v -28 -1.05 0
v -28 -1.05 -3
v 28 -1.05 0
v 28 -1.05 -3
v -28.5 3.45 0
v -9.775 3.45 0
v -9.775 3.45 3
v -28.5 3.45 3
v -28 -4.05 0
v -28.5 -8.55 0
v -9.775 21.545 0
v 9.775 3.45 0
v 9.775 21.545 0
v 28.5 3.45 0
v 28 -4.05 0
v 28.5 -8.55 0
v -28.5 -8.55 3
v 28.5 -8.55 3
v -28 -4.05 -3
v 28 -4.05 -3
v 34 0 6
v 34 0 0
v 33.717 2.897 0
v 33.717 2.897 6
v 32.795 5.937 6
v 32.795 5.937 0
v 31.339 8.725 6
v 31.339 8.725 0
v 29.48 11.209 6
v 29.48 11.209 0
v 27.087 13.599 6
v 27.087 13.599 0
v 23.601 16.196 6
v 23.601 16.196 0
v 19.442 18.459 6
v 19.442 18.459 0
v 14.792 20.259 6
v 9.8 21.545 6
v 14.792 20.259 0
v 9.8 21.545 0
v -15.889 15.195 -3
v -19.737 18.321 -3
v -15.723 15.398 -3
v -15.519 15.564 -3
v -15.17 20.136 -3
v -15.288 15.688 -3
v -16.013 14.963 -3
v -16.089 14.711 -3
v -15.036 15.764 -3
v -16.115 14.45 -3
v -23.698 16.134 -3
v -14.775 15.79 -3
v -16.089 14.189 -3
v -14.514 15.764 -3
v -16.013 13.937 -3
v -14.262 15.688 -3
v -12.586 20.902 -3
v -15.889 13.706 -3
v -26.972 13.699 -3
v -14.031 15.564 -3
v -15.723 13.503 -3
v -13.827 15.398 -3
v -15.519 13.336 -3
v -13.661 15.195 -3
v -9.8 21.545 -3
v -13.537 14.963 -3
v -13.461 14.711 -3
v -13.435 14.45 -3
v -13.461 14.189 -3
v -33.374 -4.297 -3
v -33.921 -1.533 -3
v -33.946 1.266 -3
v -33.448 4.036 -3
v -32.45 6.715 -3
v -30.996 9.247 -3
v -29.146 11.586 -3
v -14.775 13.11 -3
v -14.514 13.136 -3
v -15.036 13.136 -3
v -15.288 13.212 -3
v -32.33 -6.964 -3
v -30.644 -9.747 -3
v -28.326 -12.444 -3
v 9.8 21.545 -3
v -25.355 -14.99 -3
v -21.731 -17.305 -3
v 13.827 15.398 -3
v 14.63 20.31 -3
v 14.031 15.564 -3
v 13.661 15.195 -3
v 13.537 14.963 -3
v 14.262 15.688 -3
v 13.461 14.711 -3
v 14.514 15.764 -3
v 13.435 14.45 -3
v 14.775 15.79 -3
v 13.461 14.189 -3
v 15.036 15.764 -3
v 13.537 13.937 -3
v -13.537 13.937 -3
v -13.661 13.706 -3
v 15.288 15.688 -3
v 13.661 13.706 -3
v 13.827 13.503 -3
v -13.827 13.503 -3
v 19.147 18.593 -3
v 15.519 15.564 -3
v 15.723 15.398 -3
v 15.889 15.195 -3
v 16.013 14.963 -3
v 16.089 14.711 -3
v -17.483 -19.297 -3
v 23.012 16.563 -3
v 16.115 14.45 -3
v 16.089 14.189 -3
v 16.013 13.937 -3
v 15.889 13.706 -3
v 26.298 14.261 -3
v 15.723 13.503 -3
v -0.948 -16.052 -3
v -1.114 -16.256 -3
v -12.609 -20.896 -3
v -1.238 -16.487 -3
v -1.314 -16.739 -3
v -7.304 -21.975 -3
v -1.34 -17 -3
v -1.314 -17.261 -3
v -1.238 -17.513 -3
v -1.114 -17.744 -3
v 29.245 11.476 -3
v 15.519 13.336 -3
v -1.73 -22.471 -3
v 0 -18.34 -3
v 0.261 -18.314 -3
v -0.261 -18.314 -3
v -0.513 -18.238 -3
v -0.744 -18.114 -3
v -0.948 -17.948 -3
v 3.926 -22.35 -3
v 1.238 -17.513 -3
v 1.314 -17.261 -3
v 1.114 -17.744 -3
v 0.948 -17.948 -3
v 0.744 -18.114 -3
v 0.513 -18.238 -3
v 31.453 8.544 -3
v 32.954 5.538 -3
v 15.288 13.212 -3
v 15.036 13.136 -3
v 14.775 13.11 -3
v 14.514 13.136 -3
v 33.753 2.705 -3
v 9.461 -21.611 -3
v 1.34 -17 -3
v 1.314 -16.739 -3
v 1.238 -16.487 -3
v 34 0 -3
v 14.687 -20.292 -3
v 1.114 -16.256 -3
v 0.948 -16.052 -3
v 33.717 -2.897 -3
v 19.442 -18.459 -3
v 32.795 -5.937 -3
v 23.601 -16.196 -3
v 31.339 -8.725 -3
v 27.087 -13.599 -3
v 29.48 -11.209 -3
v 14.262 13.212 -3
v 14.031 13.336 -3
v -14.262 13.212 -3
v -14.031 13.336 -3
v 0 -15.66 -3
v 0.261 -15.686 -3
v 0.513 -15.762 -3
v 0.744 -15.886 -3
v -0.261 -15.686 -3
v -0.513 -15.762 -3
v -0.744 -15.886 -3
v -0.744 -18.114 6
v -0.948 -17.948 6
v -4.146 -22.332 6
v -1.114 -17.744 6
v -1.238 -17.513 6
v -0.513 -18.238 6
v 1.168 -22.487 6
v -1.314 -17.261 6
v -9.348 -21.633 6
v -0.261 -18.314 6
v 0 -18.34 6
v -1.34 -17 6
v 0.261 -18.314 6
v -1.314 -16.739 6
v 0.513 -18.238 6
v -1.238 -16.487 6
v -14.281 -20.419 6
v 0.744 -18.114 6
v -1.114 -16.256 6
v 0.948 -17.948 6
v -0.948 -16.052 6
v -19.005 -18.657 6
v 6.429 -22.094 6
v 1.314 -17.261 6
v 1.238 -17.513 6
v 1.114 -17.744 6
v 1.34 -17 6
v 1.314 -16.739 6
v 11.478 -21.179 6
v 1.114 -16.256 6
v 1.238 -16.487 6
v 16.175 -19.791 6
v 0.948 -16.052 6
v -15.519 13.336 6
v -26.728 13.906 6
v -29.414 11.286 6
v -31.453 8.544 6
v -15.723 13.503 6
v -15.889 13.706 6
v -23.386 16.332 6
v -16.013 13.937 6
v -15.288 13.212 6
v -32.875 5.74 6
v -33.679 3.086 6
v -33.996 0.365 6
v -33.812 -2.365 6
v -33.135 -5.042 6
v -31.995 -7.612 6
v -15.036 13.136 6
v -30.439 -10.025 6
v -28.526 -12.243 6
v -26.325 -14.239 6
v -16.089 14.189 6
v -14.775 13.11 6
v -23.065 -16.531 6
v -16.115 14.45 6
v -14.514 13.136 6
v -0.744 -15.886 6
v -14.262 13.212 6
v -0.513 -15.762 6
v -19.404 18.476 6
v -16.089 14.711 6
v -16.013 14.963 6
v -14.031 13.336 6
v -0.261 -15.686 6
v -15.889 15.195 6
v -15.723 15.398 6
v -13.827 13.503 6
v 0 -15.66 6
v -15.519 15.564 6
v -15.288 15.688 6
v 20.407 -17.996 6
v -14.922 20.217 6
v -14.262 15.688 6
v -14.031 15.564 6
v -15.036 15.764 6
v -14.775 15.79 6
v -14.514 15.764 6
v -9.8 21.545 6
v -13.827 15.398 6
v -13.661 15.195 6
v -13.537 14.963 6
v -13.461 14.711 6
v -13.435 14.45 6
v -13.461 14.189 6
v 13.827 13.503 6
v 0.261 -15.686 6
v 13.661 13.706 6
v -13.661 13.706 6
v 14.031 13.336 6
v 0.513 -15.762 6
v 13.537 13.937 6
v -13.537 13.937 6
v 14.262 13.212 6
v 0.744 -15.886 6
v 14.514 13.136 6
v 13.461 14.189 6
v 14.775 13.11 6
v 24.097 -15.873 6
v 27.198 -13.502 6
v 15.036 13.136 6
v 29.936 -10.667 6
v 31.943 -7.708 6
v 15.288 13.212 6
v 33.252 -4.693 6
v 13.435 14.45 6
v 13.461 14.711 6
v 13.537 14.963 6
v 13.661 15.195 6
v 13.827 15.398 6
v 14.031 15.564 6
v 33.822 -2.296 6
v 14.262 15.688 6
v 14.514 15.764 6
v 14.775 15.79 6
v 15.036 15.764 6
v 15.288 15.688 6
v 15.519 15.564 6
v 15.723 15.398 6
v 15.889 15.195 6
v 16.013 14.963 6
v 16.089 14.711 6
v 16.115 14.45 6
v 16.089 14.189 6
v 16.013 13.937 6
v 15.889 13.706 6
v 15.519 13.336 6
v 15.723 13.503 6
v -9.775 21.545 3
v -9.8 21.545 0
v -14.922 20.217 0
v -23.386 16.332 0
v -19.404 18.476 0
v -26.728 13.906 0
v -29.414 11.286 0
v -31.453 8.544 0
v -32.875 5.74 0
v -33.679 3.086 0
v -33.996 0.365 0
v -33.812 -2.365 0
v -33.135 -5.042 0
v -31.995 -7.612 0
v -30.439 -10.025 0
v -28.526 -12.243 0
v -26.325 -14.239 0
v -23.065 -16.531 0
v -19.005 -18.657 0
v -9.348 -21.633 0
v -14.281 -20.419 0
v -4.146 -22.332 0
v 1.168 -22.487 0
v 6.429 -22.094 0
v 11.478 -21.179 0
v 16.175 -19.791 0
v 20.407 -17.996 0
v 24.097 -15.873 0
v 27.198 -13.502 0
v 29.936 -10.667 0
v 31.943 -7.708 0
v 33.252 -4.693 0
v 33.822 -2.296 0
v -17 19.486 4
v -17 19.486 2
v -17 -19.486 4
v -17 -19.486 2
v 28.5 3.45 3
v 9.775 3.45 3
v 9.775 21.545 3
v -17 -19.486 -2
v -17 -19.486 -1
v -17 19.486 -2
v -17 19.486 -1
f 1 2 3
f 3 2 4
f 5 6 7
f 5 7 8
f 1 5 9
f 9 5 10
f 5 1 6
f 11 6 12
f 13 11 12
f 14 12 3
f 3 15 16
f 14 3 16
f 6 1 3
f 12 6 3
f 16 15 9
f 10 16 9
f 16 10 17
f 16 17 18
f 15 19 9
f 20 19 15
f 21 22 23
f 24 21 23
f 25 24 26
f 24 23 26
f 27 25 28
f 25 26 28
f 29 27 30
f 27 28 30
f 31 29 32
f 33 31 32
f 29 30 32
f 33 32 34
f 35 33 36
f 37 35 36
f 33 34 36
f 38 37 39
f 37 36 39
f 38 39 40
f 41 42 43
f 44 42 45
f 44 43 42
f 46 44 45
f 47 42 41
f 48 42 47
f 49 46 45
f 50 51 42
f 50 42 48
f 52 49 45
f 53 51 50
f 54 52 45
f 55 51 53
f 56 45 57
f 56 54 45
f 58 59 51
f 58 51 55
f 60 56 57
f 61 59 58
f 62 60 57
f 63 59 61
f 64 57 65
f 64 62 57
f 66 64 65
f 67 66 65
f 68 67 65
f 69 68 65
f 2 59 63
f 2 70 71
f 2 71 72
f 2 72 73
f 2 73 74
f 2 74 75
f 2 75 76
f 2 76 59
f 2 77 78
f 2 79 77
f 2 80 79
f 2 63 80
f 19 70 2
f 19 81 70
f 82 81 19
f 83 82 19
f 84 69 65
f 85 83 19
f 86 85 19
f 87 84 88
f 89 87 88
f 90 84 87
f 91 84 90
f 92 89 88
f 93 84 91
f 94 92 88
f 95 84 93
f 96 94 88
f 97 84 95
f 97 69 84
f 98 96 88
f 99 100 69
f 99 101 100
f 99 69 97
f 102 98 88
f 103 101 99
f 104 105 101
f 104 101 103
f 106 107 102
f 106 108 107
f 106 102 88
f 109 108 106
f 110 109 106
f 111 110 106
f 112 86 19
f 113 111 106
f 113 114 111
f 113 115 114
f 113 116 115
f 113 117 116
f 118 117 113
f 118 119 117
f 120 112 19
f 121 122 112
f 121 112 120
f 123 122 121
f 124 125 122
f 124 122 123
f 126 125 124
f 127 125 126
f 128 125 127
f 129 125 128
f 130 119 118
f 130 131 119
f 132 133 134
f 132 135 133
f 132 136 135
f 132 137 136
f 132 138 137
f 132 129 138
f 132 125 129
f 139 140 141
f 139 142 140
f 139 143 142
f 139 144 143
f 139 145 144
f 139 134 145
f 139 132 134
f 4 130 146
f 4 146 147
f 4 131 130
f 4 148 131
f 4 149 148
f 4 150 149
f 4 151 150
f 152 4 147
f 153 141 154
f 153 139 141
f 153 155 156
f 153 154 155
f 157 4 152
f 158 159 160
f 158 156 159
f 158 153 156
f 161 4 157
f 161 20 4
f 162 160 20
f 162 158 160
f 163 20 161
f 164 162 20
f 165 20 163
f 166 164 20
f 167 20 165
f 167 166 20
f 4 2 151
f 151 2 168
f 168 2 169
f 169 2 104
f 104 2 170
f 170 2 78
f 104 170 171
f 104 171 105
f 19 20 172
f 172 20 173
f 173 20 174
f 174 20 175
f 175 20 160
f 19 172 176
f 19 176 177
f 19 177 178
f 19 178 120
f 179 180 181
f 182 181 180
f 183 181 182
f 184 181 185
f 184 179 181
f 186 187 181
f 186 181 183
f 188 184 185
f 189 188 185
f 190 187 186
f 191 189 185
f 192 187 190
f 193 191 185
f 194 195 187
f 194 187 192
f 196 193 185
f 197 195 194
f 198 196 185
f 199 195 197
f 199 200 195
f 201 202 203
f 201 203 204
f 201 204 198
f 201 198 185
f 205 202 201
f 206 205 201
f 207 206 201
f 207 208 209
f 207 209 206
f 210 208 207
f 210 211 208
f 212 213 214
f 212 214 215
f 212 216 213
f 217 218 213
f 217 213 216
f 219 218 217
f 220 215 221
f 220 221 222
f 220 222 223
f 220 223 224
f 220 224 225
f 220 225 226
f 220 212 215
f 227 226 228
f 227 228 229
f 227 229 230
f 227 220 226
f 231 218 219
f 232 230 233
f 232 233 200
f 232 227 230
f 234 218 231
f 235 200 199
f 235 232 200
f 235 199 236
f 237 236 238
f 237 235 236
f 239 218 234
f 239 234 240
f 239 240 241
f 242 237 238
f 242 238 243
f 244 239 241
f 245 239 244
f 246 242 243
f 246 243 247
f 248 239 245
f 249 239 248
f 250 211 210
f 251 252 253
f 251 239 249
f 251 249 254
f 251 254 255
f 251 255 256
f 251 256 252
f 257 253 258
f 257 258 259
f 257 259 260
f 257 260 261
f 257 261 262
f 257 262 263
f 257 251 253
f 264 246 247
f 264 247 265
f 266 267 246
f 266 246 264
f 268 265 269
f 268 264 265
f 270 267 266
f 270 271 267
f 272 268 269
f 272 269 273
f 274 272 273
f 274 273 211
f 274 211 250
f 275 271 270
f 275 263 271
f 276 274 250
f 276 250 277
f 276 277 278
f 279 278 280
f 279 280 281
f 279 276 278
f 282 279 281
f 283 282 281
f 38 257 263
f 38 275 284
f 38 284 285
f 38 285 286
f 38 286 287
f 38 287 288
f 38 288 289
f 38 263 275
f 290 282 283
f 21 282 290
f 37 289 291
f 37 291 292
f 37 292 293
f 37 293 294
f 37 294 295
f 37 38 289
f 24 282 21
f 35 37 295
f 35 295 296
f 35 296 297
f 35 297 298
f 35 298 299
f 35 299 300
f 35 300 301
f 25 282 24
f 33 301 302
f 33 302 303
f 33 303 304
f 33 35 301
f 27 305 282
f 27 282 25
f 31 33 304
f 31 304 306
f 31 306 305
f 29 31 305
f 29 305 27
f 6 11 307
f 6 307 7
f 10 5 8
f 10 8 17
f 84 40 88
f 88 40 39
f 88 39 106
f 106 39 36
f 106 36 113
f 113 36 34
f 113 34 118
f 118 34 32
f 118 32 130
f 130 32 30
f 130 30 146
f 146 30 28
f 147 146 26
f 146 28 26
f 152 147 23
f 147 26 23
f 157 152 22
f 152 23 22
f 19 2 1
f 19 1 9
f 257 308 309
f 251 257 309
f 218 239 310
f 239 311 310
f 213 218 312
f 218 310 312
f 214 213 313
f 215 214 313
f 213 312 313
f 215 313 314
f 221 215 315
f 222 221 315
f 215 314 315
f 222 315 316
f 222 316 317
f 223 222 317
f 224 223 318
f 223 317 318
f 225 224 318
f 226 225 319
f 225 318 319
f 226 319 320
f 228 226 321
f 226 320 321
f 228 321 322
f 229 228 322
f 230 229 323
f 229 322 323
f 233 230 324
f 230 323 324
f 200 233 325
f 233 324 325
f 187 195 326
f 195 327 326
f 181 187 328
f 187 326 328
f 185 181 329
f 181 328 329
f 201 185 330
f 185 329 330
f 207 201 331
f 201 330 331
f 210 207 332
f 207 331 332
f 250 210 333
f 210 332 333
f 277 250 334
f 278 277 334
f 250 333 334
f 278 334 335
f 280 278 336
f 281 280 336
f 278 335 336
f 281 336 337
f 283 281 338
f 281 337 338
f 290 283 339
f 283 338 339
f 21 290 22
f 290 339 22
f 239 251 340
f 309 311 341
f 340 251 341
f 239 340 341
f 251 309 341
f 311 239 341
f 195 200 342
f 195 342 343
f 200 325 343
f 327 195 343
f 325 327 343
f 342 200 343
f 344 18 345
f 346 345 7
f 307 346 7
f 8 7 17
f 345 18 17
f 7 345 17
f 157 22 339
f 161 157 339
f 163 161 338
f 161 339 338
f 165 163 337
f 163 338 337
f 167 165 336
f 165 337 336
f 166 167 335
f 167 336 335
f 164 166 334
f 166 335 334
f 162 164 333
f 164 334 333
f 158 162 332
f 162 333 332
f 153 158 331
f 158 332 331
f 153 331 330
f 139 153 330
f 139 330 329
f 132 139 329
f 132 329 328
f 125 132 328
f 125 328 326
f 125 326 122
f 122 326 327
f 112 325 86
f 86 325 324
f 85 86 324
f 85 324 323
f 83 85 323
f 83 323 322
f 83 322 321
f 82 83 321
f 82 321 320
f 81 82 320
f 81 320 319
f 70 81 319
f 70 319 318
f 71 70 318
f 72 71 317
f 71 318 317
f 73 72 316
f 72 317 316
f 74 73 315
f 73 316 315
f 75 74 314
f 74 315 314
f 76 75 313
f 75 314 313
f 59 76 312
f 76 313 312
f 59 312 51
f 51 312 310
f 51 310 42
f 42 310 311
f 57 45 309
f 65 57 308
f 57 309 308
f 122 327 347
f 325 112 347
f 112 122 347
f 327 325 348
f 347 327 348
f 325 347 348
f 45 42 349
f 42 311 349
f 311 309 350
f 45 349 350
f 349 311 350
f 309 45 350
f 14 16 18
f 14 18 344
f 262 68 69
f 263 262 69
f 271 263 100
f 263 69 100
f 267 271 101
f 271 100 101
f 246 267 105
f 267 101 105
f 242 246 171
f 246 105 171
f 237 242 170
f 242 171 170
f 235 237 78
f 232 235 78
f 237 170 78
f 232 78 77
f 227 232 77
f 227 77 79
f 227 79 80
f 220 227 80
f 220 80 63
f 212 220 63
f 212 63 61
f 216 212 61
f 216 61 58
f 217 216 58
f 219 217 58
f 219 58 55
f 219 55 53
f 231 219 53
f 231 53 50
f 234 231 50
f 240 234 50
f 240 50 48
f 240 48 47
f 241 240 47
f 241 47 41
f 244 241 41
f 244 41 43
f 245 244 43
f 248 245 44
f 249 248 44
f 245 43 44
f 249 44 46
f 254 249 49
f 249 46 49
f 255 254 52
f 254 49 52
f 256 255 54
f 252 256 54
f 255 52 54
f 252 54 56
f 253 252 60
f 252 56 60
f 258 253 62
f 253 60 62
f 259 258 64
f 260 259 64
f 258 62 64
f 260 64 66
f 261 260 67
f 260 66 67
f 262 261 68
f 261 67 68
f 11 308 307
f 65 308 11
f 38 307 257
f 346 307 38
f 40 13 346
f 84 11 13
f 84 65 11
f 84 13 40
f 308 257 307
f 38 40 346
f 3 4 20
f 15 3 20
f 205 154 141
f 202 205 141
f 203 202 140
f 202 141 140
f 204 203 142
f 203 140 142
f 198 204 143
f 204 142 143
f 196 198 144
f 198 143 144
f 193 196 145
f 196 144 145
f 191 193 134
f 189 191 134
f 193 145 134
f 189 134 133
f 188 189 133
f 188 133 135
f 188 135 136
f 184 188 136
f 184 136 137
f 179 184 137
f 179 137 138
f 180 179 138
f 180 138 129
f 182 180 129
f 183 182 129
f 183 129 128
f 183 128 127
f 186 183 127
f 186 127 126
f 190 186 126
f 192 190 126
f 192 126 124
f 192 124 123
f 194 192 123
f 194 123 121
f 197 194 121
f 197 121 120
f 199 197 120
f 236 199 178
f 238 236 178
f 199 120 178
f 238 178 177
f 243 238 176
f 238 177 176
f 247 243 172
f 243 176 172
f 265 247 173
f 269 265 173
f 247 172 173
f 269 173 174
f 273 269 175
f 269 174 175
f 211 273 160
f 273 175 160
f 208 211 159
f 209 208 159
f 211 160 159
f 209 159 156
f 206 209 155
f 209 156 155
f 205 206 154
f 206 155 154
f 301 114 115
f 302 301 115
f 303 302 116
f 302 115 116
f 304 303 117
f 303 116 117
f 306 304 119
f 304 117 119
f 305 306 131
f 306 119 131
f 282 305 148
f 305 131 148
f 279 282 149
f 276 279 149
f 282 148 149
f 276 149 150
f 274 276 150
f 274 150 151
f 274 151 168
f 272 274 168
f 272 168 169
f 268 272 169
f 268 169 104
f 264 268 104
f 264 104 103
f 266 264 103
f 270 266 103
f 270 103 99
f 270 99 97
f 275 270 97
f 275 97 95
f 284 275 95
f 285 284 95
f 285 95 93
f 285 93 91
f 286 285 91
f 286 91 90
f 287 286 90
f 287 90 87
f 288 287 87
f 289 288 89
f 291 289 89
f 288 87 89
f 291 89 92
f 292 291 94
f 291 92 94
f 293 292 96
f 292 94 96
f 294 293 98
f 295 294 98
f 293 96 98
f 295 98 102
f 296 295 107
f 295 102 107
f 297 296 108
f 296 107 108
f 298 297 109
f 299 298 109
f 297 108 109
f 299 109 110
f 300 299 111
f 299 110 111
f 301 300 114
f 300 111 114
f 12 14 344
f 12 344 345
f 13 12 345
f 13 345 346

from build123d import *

# Parameters (mm, degrees)
PAD_DEPTH       = 6
POCKET_DEPTH    = 3
PAD001_DEPTH    = 3
SKETCH003_W     = 56
SKETCH003_H     = 3
POCKET001_DEPTH = 3
SKETCH004_W     = 19.6
SKETCH004_H     = 1
POCKET002_DEPTH = 9.001
SKETCH005_R     = 1.34
POCKET003_DEPTH = 9.001


with BuildPart() as part:
    # Sketch → Pad (new body)
    with BuildSketch(Plane.XY):
        with BuildLine():
            add(Edge.make_bspline(
                [(34, 0), (34, 38.971143), (-17, 19.485572), (-68, 0), (-17, -19.485572), (34, -38.971143), (34, 0)],
                knots=[0, 0, 0, 2.094395, 2.094395, 4.18879, 4.18879, 6.283185, 6.283185, 6.283185], degree=2, weights=[1, 0.5, 1, 0.5, 1, 0.5, 1]))
        make_face()
    extrude(amount=PAD_DEPTH)

    # Sketch001 (on Face2 of Pad) → Pocket (cut)
    with BuildSketch(Plane(origin=(0, 0, 0), x_dir=(1, 0, 0), z_dir=(0, 0, -1))):
        Polygon((9.775, -3.450064), (9.775, -21.550064), (-9.775, -21.550064), (-9.775, -3.450064), (-28.5, -3.450064), (-28.5, 8.549936), (28.5, 8.549936), (28.5, -3.450064), align=None)
    extrude(amount=-POCKET_DEPTH, mode=Mode.SUBTRACT)

    # Sketch002 (on Face2 of Pocket) → Pad001 (join)
    with BuildSketch(Plane(origin=(0, 0, 0), x_dir=(1, 0, 0), z_dir=(0, 0, -1))):
        with BuildLine():
            add(Edge.make_bspline(
                [(34, 0), (34, 38.971143), (-17, 19.485572), (-68, 0), (-17, -19.485572), (34, -38.971143), (34, 0)],
                knots=[0, 0, 0, 2.094395, 2.094395, 4.18879, 4.18879, 6.283185, 6.283185, 6.283185], degree=2, weights=[1, 0.5, 1, 0.5, 1, 0.5, 1]))
        make_face()
    extrude(amount=PAD001_DEPTH)

    # Sketch003 (on Face4 of Pad001) → Pocket001 (cut)
    with BuildSketch(Plane(origin=(0, 0, -3), x_dir=(1, 0, 0), z_dir=(0, 0, -1))):
        with Locations((0, 2.549936)):
            Rectangle(SKETCH003_W, SKETCH003_H)
    extrude(amount=-POCKET001_DEPTH, mode=Mode.SUBTRACT)

    # Sketch004 (on Face4 of Pocket001) → Pocket002 (cut, through all)
    with BuildSketch(Plane(origin=(0, 0, -3), x_dir=(1, 0, 0), z_dir=(0, 0, -1))):
        with Locations((0, -22.045091)):
            Rectangle(SKETCH004_W, SKETCH004_H)
    extrude(amount=-POCKET002_DEPTH, mode=Mode.SUBTRACT)

    # Sketch005 (on Face7 of Pocket002) → Pocket003 (cut, through all)
    with BuildSketch(Plane(origin=(0, 0, -3), x_dir=(1, 0, 0), z_dir=(0, 0, -1))):
        with Locations((-14.775, -14.450064)):
            Circle(SKETCH005_R)
        with Locations((0, 17)):
            Circle(SKETCH005_R)
        with Locations((14.775, -14.450064)):
            Circle(SKETCH005_R)
    extrude(amount=-POCKET003_DEPTH, mode=Mode.SUBTRACT)


solid = part.part
